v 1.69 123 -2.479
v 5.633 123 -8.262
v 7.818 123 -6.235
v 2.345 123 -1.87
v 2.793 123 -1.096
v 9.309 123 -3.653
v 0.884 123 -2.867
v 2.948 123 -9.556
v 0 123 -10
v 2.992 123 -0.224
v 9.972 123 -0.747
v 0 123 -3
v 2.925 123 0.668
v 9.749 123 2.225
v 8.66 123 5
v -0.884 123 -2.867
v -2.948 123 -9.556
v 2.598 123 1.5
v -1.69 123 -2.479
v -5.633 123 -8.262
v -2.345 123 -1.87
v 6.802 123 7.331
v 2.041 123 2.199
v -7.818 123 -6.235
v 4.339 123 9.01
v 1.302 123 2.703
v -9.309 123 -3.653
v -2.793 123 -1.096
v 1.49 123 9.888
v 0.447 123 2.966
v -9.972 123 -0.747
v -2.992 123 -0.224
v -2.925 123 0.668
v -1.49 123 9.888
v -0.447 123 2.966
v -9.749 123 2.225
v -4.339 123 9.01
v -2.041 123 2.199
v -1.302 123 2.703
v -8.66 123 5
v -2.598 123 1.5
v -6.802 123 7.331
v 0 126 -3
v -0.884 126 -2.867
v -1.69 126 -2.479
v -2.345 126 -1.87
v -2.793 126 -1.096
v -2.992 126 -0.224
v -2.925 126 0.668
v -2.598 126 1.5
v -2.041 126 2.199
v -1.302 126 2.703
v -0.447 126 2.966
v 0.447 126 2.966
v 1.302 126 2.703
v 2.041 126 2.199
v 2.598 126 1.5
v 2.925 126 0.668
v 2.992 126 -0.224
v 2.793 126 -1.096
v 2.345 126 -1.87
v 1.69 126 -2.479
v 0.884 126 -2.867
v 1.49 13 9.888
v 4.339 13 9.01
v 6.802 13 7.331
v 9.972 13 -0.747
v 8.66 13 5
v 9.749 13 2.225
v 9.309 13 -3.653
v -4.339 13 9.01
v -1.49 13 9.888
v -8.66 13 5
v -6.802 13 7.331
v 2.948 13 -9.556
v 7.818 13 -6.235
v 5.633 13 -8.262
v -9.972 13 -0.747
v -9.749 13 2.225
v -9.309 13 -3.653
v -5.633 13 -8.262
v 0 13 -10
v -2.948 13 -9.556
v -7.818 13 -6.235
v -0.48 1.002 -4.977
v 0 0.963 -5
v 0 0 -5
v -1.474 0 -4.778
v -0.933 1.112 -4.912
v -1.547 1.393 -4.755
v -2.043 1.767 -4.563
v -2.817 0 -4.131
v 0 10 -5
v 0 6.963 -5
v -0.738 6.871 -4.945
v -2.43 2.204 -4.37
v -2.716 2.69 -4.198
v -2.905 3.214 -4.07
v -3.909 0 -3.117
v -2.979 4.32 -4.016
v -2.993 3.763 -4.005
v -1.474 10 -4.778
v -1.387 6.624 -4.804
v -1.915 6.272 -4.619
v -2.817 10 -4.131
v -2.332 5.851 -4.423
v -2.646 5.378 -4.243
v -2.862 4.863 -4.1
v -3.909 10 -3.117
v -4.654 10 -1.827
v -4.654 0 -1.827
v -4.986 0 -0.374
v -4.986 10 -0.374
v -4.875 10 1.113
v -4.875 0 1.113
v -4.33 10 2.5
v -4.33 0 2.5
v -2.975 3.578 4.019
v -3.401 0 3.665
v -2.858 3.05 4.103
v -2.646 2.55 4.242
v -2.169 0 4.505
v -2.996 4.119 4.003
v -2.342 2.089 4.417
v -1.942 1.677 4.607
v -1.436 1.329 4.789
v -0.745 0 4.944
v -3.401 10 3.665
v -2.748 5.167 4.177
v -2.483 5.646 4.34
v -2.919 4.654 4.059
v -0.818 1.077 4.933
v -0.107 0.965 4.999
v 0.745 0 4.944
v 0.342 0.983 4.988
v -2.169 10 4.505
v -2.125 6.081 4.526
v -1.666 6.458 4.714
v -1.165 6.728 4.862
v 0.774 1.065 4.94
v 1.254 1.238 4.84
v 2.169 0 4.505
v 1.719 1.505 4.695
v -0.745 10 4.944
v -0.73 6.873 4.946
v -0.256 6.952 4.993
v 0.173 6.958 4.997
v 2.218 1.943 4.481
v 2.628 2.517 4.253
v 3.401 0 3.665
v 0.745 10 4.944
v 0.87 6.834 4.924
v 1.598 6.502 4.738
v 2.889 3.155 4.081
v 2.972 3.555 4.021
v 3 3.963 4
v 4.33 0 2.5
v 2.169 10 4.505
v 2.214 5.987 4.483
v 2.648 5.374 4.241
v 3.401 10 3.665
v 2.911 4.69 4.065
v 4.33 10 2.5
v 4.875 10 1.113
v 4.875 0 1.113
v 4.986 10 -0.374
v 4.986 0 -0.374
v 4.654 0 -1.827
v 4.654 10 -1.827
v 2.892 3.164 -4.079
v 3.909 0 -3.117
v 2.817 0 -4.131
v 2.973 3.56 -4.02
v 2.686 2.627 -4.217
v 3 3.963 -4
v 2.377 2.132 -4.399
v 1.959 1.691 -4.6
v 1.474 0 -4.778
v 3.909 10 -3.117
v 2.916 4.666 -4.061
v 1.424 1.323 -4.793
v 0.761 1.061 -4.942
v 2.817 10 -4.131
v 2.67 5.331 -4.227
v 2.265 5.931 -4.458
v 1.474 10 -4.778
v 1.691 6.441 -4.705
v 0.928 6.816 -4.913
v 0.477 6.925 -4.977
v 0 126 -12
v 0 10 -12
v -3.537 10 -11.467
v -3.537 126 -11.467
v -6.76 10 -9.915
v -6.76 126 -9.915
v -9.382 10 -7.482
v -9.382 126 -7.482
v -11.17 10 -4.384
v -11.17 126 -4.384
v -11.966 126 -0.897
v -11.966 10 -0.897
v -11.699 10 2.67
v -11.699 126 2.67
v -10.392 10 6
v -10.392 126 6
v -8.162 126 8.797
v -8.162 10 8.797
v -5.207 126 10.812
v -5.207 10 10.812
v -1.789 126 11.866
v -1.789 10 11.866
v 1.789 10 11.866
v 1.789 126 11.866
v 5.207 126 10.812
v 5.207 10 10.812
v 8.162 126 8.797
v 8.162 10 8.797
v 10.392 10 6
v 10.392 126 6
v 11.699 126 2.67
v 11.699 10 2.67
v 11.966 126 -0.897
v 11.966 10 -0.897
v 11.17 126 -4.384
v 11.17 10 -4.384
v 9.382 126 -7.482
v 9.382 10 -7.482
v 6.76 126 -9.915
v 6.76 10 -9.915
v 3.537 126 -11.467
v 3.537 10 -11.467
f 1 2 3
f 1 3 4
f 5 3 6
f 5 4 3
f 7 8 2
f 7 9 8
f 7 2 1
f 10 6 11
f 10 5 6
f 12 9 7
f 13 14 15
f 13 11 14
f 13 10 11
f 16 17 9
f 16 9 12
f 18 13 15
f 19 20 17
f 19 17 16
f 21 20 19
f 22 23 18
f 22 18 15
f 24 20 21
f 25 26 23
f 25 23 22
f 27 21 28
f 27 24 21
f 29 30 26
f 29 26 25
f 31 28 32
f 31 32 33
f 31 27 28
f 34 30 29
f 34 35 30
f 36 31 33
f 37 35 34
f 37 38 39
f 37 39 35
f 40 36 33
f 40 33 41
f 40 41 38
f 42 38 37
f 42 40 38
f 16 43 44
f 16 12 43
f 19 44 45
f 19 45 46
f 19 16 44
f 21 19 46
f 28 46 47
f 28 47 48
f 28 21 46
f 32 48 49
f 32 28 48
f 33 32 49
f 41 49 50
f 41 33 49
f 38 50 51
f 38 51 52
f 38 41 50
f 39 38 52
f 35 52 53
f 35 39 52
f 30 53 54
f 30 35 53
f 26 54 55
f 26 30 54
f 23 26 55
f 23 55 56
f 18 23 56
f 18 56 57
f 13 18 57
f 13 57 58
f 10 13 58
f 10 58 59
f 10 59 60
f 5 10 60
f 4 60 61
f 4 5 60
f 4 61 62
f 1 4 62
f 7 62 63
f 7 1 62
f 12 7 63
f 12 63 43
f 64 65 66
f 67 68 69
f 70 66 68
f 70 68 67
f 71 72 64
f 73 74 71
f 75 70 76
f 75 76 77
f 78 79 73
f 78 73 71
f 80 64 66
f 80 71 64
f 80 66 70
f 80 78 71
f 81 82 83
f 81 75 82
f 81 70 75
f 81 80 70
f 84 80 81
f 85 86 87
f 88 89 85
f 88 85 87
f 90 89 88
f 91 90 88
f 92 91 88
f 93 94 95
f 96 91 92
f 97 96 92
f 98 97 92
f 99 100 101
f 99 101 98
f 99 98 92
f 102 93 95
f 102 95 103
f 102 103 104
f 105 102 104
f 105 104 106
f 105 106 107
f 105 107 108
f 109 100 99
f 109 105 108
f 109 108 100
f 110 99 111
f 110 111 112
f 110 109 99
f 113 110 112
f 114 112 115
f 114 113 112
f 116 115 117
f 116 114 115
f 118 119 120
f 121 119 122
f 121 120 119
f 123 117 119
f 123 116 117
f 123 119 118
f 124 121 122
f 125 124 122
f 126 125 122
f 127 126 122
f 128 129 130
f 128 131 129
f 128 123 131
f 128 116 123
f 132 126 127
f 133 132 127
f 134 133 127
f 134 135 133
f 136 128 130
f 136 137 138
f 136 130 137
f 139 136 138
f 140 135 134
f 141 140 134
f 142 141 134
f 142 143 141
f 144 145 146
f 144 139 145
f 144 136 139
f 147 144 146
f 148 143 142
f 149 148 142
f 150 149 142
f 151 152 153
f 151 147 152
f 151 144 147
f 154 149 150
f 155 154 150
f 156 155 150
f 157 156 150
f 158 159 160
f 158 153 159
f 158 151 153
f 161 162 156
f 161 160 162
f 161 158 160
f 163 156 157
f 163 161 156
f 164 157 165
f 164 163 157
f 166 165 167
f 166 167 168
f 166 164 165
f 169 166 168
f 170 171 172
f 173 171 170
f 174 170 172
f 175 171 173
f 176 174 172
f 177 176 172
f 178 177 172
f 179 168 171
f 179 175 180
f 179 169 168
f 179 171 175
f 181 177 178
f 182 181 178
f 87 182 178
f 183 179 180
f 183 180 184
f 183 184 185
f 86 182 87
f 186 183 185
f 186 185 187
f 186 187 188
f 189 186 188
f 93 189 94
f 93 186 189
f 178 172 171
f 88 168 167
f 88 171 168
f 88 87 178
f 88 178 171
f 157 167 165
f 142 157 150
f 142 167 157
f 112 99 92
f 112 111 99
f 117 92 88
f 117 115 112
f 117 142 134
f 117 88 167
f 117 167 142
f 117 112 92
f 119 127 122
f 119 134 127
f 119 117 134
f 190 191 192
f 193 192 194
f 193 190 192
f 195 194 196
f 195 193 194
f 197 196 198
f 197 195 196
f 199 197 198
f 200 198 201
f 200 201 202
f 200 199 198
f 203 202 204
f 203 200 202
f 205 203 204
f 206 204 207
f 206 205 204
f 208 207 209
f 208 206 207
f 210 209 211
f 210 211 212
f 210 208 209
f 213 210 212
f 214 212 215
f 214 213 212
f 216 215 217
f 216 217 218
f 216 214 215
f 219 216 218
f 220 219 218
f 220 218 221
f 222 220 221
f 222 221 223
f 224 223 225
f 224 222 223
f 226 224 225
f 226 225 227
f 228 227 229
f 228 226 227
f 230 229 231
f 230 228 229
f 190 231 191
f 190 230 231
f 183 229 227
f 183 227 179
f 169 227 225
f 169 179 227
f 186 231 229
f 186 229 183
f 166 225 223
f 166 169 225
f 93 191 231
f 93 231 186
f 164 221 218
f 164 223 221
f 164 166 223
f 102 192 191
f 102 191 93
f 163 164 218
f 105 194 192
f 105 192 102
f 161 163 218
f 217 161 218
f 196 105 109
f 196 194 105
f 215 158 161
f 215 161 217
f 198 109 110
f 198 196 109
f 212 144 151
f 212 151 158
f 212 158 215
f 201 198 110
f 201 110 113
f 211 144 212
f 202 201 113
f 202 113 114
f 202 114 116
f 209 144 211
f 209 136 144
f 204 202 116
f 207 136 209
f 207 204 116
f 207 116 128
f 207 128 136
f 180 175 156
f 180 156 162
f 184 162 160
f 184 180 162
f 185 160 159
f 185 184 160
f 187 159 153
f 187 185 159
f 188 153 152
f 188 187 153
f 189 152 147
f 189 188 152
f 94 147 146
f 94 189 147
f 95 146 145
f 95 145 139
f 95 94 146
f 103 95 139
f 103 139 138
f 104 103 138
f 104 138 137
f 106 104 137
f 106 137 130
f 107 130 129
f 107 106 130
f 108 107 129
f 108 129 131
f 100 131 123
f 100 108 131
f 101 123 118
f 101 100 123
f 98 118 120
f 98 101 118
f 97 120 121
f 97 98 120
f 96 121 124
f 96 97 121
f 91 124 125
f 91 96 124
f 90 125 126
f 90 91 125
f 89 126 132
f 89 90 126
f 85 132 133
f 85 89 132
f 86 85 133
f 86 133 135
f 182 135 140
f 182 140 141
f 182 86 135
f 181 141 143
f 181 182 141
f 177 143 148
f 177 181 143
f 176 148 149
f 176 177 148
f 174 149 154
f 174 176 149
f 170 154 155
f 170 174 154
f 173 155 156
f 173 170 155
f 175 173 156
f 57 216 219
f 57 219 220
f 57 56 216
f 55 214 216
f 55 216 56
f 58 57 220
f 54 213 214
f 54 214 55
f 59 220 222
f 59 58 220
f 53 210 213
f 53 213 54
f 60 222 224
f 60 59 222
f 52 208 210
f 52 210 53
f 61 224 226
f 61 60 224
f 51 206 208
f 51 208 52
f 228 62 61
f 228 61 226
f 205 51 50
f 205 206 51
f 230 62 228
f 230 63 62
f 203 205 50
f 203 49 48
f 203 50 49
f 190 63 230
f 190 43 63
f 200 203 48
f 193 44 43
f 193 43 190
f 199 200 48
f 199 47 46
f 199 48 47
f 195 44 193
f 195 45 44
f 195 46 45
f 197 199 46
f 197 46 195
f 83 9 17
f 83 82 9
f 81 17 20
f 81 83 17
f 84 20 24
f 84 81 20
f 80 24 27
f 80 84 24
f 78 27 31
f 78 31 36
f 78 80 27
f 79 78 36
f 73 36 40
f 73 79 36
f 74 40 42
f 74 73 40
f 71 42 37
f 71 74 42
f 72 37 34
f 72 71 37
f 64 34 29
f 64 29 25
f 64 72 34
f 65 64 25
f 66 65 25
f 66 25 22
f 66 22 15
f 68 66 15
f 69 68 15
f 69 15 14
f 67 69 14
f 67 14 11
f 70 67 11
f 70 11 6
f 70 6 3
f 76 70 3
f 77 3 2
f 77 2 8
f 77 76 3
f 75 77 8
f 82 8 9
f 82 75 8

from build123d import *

# Parameters (mm, degrees)
CUT_EXTRUDE_1_DEPTH      = 128.137720603
CUT_EXTRUDE_1_DEPTH_BACK = 128.137720603
SKETCH_2_R               = 3


with BuildPart() as part:
    # 草图1 → 旋转1 (revolve)
    with BuildSketch(Plane.XY, mode=Mode.PRIVATE) as revolve_1_sk:
        Polygon((0, 0), (-5, 0), (-5, 10), (-12, 10), (-12, 126), (-3, 126), (-3, 123), (-10, 123), (-10, 13), (0, 13), align=None)
    revolve(revolve_1_sk.sketch.rotate(Axis((0, 0, 0), (0, 1, 0)), 270), axis=Axis((0, 0, 0), (0, 1, 0)))

    # 草图2 → 切除-拉伸1 (cut, two sides: drawn at the far end of the back side and taken through both)
    with BuildSketch(Plane.XY.offset(-CUT_EXTRUDE_1_DEPTH_BACK)):
        with Locations((0, 3.963259356)):
            Circle(SKETCH_2_R)
    extrude(amount=CUT_EXTRUDE_1_DEPTH + CUT_EXTRUDE_1_DEPTH_BACK, mode=Mode.SUBTRACT)


solid = part.part
